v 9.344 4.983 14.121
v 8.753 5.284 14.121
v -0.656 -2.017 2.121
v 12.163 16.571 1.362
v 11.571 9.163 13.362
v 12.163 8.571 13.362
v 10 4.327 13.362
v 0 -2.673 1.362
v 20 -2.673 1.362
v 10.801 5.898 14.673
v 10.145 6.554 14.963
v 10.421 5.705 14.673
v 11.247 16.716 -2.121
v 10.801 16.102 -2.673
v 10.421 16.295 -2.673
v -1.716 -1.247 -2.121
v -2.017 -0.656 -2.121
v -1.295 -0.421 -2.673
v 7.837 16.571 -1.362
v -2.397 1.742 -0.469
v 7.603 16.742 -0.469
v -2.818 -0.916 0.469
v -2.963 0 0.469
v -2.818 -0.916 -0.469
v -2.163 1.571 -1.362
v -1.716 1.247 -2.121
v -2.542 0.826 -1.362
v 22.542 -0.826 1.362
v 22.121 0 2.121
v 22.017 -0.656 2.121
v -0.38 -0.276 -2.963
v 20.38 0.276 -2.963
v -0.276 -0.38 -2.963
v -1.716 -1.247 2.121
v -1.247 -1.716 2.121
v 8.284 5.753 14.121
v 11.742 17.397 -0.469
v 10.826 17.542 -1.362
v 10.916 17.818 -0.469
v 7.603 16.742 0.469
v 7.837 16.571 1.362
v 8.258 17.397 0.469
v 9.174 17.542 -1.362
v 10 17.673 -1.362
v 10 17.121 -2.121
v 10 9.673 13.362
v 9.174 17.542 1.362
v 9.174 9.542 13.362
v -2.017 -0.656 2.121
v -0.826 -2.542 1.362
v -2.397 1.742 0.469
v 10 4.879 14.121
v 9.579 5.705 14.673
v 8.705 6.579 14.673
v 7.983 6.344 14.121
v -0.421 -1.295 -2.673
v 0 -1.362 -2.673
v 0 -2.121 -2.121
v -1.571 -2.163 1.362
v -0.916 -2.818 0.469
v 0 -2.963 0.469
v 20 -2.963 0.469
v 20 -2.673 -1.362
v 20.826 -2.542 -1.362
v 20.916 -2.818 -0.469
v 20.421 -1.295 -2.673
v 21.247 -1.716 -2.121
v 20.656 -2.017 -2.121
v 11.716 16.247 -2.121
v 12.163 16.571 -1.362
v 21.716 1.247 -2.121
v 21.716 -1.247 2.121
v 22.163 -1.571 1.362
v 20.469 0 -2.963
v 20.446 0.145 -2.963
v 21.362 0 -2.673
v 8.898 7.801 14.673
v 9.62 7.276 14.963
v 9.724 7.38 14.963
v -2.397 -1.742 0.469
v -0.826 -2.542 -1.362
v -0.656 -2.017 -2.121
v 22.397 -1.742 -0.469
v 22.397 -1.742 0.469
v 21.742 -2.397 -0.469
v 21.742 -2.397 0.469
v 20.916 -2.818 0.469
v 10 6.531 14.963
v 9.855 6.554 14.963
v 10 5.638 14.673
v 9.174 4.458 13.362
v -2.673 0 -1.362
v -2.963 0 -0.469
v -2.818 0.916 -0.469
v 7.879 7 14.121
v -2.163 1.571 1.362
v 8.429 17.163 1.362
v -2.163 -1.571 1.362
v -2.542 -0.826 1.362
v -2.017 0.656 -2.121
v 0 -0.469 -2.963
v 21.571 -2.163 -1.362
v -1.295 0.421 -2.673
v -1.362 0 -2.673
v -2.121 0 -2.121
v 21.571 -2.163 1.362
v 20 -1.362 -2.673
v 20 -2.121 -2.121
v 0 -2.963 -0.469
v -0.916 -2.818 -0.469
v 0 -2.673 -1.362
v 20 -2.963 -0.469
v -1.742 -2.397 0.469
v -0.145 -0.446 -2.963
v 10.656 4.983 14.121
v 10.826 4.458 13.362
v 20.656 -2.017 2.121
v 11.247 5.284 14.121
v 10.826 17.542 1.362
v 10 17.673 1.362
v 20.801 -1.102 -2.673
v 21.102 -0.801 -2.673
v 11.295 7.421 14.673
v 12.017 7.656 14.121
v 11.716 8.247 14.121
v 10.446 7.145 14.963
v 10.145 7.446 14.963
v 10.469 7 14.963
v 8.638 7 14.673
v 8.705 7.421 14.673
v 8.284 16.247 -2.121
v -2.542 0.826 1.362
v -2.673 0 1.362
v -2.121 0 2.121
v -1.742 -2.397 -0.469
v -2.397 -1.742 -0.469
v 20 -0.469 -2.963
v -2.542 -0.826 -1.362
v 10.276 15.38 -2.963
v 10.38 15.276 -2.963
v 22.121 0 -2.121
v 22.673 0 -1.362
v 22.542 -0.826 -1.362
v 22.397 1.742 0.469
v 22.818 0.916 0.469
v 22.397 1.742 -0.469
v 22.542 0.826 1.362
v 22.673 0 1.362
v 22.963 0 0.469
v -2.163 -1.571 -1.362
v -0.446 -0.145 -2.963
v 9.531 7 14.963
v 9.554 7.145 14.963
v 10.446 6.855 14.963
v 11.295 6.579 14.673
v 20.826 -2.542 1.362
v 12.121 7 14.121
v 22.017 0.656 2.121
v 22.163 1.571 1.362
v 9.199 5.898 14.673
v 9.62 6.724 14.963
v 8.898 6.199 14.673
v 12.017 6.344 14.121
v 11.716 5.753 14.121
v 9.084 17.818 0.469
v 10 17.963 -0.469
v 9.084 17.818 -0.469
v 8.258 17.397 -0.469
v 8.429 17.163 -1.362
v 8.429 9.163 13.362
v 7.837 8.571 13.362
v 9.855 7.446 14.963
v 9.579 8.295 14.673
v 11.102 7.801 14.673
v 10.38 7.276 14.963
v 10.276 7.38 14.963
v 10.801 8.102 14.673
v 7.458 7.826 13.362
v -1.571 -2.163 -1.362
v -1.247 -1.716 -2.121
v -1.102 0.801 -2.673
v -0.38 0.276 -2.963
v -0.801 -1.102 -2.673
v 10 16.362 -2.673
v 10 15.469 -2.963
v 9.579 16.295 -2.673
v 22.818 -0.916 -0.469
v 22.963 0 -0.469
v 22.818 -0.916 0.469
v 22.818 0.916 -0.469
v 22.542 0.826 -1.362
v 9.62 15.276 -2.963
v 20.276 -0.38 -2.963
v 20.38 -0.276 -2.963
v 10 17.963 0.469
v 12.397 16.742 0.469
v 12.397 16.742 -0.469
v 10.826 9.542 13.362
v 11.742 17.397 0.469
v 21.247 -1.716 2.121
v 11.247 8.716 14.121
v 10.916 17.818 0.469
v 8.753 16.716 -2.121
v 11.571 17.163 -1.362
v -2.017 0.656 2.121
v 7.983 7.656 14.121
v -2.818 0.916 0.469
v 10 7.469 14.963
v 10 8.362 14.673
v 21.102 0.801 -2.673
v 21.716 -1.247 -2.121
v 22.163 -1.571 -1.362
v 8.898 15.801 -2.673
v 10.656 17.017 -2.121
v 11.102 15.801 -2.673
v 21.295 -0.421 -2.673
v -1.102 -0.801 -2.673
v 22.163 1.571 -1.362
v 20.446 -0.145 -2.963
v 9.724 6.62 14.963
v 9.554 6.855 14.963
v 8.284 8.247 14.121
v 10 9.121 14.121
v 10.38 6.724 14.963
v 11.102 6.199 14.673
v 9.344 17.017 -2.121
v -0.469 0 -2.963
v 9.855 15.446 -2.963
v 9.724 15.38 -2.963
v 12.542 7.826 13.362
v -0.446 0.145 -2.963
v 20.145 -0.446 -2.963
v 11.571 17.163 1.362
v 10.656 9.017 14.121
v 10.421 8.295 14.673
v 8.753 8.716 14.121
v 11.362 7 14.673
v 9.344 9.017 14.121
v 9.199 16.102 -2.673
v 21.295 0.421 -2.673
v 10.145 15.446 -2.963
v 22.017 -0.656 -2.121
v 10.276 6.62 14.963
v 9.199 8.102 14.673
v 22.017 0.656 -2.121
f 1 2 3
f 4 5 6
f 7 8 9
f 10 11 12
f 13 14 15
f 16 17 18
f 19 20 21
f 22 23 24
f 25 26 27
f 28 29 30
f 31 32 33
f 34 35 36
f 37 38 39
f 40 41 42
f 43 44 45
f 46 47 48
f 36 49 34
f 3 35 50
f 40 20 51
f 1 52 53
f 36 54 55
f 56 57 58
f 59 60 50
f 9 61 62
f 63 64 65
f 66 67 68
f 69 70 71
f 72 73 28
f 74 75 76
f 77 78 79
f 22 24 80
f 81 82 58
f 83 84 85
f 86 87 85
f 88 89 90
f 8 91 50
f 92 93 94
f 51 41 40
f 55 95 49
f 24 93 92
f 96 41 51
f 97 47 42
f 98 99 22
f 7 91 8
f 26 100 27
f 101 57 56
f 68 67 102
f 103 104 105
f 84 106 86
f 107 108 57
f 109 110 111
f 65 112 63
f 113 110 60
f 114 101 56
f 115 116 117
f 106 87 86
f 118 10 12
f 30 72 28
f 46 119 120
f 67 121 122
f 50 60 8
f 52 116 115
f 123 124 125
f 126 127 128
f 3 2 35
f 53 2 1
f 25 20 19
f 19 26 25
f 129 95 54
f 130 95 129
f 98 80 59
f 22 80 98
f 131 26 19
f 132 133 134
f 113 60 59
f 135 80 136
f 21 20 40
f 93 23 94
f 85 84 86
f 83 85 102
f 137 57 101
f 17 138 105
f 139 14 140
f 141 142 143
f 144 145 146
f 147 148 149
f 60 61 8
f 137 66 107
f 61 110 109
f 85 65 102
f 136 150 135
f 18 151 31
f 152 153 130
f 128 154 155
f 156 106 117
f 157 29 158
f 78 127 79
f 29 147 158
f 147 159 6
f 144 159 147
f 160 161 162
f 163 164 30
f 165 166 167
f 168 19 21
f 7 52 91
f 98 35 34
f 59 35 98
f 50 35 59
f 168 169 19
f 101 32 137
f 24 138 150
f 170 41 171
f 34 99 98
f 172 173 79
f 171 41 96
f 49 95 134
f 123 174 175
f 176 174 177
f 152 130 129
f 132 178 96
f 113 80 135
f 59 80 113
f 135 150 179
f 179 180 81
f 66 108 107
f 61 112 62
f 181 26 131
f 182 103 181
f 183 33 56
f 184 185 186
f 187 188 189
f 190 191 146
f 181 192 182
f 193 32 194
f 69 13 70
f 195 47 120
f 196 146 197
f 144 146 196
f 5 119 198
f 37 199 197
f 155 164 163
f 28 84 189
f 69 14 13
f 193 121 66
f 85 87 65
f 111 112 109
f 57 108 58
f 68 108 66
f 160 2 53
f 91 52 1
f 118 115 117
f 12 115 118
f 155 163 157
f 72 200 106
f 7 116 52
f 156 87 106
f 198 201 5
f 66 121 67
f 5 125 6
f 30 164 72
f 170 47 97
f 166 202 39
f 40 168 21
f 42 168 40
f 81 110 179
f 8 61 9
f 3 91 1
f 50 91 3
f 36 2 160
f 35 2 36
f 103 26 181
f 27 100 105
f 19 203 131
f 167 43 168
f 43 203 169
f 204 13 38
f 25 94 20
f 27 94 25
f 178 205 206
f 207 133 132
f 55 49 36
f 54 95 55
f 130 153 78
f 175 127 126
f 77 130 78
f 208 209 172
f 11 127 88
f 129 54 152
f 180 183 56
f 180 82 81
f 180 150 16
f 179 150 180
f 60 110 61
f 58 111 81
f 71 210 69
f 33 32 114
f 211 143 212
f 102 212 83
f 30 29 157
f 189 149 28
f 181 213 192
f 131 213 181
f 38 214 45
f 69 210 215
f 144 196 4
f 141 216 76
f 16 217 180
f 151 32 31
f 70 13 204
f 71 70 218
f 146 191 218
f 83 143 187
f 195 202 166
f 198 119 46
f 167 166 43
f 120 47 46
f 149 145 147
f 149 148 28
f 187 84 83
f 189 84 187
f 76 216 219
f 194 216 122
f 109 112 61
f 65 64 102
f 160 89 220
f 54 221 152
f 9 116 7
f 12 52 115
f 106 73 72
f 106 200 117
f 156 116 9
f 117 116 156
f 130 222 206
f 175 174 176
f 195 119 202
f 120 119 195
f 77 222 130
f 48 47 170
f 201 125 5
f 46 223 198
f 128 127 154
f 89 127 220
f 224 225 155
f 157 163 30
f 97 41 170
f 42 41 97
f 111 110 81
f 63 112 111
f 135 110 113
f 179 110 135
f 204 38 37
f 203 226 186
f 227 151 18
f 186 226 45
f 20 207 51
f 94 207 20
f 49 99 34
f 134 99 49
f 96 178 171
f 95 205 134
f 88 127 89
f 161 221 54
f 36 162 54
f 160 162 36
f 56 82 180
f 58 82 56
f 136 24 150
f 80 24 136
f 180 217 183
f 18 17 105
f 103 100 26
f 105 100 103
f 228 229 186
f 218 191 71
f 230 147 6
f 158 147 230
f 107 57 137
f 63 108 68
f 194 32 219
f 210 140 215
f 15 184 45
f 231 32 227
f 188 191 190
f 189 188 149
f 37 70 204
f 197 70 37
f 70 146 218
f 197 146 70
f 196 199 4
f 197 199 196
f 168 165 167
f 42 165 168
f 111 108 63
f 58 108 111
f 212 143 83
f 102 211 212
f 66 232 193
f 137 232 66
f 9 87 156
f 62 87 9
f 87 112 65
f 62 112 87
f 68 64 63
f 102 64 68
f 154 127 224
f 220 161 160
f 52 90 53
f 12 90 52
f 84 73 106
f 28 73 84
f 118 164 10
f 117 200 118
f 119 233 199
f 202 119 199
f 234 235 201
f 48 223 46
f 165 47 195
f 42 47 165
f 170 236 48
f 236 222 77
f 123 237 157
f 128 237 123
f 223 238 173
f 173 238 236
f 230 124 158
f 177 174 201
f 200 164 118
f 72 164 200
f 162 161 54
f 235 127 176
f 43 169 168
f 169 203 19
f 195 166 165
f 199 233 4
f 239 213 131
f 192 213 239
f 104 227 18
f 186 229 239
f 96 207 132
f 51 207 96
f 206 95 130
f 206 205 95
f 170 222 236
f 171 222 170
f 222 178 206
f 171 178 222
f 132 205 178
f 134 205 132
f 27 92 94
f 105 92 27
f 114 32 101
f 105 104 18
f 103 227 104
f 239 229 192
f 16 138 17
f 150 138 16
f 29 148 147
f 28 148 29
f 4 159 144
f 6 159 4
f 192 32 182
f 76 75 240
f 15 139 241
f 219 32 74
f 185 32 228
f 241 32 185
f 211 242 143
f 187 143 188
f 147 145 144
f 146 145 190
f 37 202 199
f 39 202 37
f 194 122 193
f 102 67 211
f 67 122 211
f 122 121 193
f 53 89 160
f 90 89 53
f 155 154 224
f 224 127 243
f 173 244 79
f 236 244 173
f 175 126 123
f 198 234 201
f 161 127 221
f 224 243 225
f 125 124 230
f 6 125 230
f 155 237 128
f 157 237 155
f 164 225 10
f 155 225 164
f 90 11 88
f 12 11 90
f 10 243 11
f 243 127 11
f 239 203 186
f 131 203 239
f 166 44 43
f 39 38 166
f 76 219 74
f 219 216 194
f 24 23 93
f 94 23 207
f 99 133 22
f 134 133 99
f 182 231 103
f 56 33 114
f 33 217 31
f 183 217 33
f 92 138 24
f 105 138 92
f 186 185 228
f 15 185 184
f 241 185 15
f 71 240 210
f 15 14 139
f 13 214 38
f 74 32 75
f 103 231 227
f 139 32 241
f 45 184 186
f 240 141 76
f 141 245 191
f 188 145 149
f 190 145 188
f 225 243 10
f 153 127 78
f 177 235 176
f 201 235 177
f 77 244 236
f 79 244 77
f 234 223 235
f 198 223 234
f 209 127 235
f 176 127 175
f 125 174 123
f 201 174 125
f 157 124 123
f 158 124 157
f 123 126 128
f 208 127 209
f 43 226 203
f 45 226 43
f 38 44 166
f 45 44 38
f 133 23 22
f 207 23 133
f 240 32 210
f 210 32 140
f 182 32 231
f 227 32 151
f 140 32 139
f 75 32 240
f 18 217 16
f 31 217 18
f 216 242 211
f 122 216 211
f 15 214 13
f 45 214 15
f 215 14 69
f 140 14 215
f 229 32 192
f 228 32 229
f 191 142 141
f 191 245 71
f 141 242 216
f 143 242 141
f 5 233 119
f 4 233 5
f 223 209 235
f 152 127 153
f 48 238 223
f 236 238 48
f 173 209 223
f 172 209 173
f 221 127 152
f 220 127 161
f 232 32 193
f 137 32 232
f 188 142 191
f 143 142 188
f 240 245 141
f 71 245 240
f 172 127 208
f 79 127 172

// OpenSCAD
// TEST 05: hull()
// Expected: hull of 4 spheres = rounded tetrahedron-ish shape.
// Check: CSG mesh is non-empty and looks convex.
// Check: editing a translate inside hull updates mesh in real time.

$fn = 20;

hull() {
    translate([0,  0,  0 ]) { sphere(r=3); }
    translate([20, 0,  0 ]) { sphere(r=3); }
    translate([10, 15, 0 ]) { sphere(r=3); }
    translate([10, 7,  12]) { sphere(r=3); }
}
